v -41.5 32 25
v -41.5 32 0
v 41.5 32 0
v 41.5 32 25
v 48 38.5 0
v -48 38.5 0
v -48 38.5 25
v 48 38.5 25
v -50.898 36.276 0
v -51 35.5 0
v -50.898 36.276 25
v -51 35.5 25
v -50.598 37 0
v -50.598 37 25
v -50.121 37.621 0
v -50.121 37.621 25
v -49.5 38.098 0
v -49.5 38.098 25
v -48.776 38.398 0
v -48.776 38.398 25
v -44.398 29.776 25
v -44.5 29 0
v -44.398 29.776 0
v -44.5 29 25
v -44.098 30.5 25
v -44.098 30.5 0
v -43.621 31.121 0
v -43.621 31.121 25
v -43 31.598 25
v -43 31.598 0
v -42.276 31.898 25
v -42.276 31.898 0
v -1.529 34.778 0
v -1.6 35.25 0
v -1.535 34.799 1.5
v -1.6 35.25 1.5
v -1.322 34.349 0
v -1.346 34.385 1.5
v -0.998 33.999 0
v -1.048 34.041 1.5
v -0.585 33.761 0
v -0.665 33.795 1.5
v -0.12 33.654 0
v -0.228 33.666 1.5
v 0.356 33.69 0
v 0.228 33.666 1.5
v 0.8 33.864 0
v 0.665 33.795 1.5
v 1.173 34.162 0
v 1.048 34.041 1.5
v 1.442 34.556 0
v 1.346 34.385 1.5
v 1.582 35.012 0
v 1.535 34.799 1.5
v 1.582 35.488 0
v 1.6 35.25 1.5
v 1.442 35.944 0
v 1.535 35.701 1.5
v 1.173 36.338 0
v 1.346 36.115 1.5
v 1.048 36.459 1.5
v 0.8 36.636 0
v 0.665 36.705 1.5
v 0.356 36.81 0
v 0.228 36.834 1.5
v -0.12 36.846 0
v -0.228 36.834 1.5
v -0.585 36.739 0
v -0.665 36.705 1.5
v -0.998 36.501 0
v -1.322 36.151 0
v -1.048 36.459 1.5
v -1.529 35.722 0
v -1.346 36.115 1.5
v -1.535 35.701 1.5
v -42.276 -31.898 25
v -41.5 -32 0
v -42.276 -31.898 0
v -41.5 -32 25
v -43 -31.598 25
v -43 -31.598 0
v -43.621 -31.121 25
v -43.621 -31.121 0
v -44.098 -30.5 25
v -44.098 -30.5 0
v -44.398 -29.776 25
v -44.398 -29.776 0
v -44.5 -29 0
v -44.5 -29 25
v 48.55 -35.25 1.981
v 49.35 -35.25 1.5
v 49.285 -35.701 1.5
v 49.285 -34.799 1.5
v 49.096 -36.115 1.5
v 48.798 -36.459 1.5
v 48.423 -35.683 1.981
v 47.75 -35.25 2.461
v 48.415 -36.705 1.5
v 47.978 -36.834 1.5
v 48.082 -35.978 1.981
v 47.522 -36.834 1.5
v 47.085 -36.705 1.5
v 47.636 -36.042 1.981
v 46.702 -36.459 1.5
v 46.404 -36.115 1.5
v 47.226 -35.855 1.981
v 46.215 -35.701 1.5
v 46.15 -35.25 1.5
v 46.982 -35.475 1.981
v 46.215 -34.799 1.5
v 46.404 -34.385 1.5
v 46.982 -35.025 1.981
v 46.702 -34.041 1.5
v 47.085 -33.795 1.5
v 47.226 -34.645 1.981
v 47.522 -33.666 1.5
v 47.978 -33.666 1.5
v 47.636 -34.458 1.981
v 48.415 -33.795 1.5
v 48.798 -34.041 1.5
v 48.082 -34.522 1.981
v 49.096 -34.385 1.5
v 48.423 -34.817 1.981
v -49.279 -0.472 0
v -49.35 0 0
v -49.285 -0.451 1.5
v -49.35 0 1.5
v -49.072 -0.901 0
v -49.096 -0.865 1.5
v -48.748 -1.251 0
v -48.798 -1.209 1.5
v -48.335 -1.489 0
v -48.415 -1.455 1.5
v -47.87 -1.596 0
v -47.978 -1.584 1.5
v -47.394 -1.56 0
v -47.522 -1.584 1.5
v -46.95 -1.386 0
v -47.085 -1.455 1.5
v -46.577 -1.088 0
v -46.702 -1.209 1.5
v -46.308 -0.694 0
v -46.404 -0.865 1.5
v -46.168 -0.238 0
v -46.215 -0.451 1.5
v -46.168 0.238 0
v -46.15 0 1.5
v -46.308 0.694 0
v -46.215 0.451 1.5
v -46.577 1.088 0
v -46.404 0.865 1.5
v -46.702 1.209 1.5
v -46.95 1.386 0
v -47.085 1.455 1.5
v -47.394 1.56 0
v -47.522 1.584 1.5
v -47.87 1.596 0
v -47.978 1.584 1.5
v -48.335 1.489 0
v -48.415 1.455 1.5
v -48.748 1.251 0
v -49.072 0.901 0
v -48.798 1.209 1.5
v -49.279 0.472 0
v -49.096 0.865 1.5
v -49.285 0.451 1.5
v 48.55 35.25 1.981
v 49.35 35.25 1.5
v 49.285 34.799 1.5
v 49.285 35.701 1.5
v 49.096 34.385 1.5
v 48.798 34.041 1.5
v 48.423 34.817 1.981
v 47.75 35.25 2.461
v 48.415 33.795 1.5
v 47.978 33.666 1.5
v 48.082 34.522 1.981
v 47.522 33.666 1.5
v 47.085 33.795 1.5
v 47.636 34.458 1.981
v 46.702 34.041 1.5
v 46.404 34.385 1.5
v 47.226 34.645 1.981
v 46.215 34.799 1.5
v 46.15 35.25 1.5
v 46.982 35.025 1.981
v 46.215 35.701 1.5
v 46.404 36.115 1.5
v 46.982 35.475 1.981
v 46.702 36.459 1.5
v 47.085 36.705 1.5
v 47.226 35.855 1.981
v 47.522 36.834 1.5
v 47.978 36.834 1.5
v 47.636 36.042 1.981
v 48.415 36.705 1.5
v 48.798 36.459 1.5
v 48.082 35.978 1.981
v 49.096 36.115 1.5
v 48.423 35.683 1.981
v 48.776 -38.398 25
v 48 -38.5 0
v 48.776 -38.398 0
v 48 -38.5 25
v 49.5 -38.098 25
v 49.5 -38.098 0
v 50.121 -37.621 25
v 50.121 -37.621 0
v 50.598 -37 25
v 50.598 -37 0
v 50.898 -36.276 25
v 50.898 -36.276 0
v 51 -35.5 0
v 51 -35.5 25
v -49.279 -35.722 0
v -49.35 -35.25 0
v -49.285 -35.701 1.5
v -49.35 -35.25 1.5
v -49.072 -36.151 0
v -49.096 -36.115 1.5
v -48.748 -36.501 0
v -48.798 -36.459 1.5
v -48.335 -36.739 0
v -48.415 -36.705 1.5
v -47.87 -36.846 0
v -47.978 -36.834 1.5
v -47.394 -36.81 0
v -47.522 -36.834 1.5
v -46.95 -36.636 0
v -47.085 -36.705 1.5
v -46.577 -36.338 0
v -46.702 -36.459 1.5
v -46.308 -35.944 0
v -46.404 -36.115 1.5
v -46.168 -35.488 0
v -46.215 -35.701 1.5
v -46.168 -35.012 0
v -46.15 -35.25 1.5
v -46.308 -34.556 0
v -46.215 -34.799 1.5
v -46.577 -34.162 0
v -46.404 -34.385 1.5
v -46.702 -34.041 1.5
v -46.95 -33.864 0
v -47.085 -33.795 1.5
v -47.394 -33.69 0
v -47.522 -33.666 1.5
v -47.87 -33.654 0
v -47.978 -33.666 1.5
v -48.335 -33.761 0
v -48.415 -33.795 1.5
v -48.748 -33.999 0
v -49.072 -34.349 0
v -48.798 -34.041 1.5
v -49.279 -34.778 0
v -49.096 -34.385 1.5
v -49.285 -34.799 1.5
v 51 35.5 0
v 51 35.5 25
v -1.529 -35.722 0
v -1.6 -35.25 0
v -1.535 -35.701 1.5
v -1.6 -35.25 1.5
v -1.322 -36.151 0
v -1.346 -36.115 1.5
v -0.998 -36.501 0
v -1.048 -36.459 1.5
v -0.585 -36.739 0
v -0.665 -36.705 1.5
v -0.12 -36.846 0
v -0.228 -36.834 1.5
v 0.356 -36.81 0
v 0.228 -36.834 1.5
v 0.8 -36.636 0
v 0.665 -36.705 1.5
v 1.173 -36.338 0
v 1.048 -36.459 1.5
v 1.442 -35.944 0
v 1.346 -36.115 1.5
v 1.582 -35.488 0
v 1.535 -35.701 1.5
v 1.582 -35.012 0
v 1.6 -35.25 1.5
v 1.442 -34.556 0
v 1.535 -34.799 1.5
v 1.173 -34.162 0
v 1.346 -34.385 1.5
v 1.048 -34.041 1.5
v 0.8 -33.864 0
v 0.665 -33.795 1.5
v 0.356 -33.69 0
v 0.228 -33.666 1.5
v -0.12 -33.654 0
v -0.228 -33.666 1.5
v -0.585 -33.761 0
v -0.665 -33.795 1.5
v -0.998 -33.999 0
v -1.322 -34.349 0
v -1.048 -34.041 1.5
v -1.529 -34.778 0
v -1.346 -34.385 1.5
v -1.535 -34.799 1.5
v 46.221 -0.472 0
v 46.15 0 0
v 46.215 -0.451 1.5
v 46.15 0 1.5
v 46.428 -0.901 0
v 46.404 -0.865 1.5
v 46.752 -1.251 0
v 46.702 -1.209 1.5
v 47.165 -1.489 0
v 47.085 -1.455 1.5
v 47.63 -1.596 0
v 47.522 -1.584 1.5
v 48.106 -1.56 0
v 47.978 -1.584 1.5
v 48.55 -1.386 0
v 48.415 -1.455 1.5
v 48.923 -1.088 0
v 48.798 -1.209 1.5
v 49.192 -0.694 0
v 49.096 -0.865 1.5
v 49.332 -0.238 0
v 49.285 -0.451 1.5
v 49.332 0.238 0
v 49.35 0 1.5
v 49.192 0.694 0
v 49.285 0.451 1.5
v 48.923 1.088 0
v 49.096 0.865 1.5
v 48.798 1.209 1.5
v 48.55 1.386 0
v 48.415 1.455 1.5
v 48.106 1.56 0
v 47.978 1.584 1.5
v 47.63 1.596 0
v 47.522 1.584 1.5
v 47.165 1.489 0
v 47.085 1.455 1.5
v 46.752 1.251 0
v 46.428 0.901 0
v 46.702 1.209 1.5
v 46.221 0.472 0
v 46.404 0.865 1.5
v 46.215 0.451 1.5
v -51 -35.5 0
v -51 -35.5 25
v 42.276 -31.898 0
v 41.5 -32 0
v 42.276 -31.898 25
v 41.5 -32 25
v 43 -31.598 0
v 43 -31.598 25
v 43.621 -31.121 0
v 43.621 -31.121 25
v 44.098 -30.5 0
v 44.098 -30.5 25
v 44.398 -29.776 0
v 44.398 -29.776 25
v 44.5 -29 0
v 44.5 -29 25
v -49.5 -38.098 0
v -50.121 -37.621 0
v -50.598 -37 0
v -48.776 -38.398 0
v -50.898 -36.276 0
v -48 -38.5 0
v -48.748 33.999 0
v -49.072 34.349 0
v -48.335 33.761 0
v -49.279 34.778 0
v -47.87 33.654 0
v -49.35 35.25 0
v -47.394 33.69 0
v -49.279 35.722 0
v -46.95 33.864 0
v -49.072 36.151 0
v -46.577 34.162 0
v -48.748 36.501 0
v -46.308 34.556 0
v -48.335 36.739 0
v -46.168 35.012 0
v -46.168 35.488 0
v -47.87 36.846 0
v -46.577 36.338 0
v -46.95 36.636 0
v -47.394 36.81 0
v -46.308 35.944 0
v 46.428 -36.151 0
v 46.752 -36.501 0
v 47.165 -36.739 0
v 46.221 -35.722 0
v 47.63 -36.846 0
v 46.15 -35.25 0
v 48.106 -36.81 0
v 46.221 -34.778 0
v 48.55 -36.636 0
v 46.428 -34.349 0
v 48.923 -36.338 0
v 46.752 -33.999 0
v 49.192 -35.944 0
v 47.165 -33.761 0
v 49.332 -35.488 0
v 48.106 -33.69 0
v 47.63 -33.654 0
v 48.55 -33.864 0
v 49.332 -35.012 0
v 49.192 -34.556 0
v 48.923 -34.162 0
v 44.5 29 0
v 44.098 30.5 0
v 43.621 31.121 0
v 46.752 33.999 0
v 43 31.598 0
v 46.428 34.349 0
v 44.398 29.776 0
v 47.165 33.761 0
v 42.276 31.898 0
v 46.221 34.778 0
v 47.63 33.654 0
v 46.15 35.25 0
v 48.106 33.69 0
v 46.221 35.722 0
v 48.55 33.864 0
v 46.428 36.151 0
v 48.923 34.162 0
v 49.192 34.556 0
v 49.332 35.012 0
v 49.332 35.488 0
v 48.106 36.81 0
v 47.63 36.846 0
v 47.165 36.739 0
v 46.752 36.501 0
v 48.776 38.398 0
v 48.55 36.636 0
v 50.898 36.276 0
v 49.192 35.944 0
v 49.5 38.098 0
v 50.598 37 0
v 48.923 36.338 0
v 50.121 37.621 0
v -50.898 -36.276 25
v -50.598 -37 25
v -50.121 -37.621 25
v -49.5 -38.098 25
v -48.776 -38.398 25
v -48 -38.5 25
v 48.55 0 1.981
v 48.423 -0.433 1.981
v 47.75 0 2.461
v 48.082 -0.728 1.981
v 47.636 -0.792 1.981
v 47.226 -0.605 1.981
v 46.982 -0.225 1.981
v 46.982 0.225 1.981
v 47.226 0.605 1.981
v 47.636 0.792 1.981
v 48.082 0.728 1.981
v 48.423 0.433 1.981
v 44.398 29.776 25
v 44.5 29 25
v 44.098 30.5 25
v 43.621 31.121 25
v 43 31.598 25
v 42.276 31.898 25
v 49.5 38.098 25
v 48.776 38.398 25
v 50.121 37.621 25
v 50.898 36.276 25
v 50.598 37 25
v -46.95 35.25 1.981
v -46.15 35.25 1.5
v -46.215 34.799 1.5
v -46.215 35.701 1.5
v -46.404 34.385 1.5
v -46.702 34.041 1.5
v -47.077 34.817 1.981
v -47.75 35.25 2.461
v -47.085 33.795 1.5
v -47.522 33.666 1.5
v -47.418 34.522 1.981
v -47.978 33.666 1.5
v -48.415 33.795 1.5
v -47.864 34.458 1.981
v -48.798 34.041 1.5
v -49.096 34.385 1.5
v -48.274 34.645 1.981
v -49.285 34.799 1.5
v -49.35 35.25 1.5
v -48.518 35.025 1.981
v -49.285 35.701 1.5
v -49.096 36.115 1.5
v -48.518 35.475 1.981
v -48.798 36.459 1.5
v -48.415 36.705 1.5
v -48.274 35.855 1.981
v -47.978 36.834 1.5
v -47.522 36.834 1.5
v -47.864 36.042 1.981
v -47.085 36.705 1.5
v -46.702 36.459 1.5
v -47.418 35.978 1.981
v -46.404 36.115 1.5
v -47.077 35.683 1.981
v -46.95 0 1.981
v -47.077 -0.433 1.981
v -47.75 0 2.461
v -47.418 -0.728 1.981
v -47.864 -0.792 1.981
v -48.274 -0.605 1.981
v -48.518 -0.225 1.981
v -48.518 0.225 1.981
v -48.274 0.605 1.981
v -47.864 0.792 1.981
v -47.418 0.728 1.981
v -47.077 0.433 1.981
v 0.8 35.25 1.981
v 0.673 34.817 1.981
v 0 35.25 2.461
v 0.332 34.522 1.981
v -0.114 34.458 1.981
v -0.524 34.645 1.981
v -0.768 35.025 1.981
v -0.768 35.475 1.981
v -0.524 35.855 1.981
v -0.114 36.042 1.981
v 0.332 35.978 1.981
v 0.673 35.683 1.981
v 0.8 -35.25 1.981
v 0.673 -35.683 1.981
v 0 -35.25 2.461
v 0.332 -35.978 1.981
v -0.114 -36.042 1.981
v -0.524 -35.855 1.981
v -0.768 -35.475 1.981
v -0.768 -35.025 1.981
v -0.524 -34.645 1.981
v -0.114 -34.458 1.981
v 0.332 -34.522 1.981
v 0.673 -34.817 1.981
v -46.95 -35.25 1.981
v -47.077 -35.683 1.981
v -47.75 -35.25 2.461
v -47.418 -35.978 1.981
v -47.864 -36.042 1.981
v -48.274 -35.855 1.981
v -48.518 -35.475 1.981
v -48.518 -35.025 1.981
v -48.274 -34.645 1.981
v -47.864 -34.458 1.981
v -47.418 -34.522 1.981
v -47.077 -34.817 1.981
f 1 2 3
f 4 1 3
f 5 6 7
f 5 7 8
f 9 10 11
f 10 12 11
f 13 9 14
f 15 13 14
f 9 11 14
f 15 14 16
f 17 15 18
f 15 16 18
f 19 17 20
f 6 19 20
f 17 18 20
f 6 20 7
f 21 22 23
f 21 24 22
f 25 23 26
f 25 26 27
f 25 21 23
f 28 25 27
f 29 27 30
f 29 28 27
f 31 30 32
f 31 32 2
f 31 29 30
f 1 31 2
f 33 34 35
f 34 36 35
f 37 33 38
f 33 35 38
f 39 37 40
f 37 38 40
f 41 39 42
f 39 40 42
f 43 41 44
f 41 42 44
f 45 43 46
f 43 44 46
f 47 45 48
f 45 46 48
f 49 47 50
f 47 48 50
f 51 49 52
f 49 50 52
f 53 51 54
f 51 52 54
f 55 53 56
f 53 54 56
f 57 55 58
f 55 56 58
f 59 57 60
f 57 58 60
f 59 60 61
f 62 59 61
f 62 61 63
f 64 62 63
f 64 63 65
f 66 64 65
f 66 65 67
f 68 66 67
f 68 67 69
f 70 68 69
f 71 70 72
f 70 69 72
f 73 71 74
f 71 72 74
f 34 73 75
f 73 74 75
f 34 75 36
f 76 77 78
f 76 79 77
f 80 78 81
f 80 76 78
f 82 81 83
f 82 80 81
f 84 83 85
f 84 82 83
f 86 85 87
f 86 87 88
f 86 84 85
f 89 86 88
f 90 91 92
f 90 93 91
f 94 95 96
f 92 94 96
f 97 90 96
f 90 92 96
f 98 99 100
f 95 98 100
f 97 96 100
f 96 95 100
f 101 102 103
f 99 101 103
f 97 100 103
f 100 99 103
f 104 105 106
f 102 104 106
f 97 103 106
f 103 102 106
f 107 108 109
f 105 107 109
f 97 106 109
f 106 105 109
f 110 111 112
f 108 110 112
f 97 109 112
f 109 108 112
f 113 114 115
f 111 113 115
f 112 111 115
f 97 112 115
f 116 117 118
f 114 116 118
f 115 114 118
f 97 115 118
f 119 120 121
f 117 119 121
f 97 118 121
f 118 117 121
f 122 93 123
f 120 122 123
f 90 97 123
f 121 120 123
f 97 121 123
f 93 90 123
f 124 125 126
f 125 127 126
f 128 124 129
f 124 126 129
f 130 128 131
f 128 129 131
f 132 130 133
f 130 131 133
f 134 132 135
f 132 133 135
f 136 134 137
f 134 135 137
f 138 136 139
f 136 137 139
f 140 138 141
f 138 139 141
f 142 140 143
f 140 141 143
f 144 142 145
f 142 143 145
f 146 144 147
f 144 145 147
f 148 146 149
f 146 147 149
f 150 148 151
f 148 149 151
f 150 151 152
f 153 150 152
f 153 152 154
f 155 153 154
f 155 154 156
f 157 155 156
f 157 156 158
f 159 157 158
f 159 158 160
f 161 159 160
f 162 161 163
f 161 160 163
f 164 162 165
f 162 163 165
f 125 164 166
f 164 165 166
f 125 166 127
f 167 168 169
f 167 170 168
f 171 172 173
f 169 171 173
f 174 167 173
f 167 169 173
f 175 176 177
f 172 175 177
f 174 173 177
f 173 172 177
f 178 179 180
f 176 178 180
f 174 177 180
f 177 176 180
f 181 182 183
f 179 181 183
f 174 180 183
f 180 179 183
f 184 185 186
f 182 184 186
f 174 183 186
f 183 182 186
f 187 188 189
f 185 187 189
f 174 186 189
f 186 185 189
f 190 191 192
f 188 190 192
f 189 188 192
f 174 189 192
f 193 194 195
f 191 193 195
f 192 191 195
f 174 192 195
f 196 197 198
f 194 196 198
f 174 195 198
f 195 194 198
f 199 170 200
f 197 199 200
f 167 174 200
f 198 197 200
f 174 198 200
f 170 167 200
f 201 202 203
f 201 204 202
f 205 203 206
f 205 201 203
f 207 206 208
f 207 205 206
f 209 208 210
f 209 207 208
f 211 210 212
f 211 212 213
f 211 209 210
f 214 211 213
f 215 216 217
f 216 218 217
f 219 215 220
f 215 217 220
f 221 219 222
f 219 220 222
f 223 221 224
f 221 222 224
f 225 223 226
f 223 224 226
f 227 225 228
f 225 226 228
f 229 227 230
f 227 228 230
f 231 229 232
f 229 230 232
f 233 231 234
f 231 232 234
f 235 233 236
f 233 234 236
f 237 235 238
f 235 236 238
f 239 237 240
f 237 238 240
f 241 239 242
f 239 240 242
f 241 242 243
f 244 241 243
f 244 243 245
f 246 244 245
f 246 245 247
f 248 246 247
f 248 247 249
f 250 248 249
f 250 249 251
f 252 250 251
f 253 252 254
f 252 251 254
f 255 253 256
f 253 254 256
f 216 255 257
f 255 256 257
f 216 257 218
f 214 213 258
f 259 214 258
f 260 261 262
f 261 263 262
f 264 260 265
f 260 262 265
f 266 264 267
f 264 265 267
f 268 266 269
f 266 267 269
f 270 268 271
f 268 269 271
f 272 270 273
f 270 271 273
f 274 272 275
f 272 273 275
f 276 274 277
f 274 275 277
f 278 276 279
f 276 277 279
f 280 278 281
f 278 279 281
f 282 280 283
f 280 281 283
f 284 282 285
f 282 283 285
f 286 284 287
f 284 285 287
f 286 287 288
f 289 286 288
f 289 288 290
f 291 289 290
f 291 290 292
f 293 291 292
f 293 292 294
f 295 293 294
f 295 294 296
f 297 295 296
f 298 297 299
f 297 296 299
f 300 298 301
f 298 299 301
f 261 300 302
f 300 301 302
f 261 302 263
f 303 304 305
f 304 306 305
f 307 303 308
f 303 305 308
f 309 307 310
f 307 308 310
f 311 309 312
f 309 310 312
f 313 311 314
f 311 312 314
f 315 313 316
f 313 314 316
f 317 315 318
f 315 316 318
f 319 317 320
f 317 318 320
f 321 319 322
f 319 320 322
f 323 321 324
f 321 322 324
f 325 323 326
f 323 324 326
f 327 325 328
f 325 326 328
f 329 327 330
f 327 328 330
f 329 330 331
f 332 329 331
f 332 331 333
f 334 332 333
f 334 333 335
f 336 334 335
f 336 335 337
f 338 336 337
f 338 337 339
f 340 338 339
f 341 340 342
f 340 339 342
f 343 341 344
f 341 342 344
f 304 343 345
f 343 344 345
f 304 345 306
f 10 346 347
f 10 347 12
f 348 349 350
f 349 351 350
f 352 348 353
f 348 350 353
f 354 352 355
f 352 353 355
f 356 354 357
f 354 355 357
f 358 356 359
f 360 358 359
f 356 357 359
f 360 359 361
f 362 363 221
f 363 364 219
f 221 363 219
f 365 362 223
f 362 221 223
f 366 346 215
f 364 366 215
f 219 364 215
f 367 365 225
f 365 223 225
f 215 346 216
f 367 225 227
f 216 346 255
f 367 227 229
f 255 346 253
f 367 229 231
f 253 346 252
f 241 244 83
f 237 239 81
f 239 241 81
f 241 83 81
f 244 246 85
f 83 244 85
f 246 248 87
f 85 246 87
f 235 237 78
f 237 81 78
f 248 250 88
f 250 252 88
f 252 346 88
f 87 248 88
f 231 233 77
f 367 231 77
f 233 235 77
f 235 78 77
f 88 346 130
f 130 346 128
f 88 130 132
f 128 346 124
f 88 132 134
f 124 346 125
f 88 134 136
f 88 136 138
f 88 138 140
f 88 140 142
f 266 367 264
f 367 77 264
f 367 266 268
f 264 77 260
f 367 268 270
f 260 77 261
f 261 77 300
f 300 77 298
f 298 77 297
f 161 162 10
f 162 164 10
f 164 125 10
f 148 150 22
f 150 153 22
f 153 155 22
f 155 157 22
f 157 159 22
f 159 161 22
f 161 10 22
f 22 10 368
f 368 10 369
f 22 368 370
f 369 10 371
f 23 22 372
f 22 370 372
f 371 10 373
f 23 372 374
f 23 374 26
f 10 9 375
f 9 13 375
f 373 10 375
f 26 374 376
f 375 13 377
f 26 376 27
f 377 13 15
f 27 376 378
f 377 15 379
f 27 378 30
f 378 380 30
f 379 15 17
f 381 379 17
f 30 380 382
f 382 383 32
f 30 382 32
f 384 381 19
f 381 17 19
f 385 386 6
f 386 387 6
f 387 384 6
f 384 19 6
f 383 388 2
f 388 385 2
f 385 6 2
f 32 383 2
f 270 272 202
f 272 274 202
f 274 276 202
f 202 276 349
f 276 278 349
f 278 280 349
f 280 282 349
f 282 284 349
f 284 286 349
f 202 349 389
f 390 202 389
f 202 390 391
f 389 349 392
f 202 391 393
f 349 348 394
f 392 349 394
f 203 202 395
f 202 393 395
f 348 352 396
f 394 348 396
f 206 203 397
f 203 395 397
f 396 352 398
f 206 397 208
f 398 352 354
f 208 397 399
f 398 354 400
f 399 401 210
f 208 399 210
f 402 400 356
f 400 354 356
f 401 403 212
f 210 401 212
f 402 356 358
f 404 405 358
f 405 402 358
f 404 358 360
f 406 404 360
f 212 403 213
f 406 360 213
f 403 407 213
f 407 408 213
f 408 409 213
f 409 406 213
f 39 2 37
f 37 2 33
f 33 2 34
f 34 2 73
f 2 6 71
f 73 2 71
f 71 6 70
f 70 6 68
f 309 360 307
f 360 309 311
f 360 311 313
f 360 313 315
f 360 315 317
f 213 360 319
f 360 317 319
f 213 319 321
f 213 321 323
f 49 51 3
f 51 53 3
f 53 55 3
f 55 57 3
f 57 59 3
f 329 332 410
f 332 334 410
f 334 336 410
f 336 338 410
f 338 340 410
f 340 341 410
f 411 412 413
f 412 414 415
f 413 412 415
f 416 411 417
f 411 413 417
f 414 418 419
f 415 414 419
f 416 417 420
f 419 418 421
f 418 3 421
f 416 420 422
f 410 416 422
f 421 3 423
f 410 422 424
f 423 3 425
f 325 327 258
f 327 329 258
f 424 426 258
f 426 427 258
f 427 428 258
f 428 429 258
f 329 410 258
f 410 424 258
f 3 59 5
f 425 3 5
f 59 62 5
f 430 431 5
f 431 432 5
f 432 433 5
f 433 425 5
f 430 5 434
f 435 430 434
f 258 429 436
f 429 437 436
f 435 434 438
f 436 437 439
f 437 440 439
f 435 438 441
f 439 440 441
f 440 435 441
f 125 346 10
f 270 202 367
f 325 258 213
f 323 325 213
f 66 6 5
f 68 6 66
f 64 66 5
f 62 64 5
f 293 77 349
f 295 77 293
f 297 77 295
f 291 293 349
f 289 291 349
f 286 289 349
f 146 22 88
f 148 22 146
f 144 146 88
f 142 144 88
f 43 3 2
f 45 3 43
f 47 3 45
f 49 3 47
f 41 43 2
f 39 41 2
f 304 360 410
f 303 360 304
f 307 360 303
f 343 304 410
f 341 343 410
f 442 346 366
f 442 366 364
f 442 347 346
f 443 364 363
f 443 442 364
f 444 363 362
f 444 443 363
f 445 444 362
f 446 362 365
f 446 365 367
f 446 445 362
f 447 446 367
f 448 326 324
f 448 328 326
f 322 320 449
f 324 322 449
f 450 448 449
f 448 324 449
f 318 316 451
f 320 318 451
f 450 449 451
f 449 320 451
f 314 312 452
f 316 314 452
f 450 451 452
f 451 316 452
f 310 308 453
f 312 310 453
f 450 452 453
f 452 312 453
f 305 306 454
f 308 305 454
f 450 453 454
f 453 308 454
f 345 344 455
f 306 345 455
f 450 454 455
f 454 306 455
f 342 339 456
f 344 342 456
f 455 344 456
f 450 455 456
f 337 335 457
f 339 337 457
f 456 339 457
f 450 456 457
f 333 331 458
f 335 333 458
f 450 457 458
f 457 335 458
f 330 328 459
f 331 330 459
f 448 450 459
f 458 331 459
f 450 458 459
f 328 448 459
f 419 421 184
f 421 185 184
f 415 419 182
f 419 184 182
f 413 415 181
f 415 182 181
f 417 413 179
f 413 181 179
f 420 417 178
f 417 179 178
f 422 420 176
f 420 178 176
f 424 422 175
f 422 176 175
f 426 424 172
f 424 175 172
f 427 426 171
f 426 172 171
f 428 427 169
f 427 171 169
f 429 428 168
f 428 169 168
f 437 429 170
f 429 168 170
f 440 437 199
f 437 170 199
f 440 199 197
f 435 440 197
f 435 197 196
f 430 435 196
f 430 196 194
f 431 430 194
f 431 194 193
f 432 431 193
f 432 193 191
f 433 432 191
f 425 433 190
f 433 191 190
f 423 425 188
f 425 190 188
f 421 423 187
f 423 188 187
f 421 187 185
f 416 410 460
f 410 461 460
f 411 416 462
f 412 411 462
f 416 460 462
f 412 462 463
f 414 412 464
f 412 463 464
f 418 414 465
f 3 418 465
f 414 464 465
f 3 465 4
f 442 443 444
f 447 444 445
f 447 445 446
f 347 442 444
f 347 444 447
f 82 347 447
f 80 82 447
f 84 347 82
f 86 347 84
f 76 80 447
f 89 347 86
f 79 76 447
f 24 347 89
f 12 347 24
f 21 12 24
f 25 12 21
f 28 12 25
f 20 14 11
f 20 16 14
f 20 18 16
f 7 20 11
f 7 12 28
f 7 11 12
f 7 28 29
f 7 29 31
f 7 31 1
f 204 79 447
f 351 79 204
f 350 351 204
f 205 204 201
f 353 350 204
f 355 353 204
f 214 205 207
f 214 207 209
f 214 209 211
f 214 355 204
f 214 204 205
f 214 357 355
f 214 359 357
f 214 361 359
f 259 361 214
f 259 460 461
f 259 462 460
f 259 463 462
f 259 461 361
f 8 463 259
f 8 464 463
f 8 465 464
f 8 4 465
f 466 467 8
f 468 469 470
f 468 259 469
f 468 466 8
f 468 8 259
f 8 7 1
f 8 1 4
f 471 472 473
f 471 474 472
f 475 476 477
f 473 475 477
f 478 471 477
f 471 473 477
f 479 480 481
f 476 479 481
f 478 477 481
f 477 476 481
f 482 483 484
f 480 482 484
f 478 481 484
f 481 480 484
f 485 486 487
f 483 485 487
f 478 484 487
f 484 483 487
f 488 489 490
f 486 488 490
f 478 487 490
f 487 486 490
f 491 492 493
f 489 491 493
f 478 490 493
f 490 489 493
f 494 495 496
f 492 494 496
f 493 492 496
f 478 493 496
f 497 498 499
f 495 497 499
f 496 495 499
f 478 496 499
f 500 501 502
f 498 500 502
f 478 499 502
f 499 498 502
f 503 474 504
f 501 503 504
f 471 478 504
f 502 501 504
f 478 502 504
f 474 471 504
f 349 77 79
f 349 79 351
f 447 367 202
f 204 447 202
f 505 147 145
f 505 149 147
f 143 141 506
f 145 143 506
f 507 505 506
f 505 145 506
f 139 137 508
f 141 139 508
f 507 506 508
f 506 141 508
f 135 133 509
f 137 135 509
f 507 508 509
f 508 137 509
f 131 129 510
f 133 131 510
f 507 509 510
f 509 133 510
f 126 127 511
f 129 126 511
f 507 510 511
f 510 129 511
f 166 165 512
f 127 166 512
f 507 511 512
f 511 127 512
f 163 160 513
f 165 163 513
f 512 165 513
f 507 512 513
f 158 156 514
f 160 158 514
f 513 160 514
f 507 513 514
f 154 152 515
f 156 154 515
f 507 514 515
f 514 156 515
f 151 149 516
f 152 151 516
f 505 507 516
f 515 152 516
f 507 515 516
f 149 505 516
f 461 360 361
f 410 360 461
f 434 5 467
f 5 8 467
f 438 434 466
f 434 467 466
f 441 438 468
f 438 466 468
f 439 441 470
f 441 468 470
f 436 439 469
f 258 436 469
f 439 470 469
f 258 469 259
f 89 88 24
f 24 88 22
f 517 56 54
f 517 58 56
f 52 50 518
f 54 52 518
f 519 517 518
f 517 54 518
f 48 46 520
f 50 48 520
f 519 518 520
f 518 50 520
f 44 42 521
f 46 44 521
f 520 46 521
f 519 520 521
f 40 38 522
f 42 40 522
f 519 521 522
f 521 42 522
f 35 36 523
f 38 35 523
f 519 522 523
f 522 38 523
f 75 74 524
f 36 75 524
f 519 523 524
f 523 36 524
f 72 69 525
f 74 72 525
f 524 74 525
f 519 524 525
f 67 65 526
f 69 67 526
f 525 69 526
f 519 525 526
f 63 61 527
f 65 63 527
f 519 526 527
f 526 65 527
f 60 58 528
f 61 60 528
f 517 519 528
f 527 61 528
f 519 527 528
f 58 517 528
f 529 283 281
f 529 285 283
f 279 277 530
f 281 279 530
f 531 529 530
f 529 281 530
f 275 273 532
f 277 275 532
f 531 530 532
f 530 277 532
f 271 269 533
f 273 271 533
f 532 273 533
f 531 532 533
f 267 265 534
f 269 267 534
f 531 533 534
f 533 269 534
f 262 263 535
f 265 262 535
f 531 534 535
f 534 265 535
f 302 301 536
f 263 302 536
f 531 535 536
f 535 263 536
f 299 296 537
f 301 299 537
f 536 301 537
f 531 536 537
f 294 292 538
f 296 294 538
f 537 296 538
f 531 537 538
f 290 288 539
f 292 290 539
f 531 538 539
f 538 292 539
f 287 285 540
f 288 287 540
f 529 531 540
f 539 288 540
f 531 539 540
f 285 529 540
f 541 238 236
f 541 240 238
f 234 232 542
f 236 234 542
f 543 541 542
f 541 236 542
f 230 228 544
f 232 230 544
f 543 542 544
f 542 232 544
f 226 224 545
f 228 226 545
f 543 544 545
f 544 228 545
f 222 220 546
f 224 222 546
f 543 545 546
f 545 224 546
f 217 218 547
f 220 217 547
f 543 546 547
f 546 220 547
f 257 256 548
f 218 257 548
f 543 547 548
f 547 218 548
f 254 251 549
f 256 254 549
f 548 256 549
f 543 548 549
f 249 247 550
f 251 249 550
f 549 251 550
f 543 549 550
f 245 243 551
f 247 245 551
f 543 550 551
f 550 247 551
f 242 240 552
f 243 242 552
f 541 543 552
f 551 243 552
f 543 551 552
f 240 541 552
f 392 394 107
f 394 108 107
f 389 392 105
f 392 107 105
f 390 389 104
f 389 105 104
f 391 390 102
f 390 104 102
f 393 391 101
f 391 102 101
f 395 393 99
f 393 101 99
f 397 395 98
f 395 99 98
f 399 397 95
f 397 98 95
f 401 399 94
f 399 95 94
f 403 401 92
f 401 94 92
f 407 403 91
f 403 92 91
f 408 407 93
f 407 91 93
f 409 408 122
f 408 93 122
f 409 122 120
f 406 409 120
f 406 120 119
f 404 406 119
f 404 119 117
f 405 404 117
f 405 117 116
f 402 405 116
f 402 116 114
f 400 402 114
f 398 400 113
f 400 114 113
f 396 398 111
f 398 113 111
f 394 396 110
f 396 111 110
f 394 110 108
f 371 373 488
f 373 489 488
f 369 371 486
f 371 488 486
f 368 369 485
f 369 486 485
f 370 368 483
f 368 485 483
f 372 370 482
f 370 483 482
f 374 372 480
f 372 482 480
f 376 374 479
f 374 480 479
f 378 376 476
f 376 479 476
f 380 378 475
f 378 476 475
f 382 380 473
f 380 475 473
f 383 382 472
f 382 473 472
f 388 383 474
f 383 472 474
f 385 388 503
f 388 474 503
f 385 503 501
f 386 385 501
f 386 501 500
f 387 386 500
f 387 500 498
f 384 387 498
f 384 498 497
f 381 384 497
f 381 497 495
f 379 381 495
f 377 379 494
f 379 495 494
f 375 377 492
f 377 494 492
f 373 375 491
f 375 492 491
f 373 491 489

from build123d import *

# Parameters (mm, degrees)
F0_W     = 102
F0_H     = 77
F0_W_2   = 89
F0_H_2   = 64
F1_DEPTH = 25
F2_D     = 3.2
F2_DEPTH = 1.5
F2_TIP   = 0.9613769904
F3_R     = 3


with BuildPart() as f1:
    # F0 (on Top) → F1 (new body)
    with BuildSketch(Plane.XY):
        Rectangle(F0_W, F0_H)
        Rectangle(F0_W_2, F0_H_2, mode=Mode.SUBTRACT)
    extrude(amount=F1_DEPTH)

    # F2
    with Locations(Plane(origin=(0, 0, 0), x_dir=(1, 0, 0), z_dir=(0, 0, -1))):
        with Locations((-47.75, 35.25), (0, 35.25), (47.75, 35.25), (47.75, 0), (47.75, -35.25), (0, -35.25), (-47.75, -35.25), (-47.75, 0)):
            Hole(F2_D / 2, depth=F2_DEPTH)
            with Locations((0, 0, -(F2_DEPTH + F2_TIP / 2))):  # 118° drill point
                Cone(0, F2_D / 2, F2_TIP, mode=Mode.SUBTRACT)

    # F3
    f3_edges = [f1.edges().sort_by_distance(p)[0] for p in [
        (-44.5, -32, 12.5),
        (44.5, -32, 12.5),
        (-44.5, 32, 12.5),
        (44.5, 32, 12.5),
        (-51, -38.5, 12.5),
        (-51, 38.5, 12.5),
        (51, 38.5, 12.5),
        (51, -38.5, 12.5),
    ]]
    fillet(f3_edges, radius=F3_R)


solid = f1.part
